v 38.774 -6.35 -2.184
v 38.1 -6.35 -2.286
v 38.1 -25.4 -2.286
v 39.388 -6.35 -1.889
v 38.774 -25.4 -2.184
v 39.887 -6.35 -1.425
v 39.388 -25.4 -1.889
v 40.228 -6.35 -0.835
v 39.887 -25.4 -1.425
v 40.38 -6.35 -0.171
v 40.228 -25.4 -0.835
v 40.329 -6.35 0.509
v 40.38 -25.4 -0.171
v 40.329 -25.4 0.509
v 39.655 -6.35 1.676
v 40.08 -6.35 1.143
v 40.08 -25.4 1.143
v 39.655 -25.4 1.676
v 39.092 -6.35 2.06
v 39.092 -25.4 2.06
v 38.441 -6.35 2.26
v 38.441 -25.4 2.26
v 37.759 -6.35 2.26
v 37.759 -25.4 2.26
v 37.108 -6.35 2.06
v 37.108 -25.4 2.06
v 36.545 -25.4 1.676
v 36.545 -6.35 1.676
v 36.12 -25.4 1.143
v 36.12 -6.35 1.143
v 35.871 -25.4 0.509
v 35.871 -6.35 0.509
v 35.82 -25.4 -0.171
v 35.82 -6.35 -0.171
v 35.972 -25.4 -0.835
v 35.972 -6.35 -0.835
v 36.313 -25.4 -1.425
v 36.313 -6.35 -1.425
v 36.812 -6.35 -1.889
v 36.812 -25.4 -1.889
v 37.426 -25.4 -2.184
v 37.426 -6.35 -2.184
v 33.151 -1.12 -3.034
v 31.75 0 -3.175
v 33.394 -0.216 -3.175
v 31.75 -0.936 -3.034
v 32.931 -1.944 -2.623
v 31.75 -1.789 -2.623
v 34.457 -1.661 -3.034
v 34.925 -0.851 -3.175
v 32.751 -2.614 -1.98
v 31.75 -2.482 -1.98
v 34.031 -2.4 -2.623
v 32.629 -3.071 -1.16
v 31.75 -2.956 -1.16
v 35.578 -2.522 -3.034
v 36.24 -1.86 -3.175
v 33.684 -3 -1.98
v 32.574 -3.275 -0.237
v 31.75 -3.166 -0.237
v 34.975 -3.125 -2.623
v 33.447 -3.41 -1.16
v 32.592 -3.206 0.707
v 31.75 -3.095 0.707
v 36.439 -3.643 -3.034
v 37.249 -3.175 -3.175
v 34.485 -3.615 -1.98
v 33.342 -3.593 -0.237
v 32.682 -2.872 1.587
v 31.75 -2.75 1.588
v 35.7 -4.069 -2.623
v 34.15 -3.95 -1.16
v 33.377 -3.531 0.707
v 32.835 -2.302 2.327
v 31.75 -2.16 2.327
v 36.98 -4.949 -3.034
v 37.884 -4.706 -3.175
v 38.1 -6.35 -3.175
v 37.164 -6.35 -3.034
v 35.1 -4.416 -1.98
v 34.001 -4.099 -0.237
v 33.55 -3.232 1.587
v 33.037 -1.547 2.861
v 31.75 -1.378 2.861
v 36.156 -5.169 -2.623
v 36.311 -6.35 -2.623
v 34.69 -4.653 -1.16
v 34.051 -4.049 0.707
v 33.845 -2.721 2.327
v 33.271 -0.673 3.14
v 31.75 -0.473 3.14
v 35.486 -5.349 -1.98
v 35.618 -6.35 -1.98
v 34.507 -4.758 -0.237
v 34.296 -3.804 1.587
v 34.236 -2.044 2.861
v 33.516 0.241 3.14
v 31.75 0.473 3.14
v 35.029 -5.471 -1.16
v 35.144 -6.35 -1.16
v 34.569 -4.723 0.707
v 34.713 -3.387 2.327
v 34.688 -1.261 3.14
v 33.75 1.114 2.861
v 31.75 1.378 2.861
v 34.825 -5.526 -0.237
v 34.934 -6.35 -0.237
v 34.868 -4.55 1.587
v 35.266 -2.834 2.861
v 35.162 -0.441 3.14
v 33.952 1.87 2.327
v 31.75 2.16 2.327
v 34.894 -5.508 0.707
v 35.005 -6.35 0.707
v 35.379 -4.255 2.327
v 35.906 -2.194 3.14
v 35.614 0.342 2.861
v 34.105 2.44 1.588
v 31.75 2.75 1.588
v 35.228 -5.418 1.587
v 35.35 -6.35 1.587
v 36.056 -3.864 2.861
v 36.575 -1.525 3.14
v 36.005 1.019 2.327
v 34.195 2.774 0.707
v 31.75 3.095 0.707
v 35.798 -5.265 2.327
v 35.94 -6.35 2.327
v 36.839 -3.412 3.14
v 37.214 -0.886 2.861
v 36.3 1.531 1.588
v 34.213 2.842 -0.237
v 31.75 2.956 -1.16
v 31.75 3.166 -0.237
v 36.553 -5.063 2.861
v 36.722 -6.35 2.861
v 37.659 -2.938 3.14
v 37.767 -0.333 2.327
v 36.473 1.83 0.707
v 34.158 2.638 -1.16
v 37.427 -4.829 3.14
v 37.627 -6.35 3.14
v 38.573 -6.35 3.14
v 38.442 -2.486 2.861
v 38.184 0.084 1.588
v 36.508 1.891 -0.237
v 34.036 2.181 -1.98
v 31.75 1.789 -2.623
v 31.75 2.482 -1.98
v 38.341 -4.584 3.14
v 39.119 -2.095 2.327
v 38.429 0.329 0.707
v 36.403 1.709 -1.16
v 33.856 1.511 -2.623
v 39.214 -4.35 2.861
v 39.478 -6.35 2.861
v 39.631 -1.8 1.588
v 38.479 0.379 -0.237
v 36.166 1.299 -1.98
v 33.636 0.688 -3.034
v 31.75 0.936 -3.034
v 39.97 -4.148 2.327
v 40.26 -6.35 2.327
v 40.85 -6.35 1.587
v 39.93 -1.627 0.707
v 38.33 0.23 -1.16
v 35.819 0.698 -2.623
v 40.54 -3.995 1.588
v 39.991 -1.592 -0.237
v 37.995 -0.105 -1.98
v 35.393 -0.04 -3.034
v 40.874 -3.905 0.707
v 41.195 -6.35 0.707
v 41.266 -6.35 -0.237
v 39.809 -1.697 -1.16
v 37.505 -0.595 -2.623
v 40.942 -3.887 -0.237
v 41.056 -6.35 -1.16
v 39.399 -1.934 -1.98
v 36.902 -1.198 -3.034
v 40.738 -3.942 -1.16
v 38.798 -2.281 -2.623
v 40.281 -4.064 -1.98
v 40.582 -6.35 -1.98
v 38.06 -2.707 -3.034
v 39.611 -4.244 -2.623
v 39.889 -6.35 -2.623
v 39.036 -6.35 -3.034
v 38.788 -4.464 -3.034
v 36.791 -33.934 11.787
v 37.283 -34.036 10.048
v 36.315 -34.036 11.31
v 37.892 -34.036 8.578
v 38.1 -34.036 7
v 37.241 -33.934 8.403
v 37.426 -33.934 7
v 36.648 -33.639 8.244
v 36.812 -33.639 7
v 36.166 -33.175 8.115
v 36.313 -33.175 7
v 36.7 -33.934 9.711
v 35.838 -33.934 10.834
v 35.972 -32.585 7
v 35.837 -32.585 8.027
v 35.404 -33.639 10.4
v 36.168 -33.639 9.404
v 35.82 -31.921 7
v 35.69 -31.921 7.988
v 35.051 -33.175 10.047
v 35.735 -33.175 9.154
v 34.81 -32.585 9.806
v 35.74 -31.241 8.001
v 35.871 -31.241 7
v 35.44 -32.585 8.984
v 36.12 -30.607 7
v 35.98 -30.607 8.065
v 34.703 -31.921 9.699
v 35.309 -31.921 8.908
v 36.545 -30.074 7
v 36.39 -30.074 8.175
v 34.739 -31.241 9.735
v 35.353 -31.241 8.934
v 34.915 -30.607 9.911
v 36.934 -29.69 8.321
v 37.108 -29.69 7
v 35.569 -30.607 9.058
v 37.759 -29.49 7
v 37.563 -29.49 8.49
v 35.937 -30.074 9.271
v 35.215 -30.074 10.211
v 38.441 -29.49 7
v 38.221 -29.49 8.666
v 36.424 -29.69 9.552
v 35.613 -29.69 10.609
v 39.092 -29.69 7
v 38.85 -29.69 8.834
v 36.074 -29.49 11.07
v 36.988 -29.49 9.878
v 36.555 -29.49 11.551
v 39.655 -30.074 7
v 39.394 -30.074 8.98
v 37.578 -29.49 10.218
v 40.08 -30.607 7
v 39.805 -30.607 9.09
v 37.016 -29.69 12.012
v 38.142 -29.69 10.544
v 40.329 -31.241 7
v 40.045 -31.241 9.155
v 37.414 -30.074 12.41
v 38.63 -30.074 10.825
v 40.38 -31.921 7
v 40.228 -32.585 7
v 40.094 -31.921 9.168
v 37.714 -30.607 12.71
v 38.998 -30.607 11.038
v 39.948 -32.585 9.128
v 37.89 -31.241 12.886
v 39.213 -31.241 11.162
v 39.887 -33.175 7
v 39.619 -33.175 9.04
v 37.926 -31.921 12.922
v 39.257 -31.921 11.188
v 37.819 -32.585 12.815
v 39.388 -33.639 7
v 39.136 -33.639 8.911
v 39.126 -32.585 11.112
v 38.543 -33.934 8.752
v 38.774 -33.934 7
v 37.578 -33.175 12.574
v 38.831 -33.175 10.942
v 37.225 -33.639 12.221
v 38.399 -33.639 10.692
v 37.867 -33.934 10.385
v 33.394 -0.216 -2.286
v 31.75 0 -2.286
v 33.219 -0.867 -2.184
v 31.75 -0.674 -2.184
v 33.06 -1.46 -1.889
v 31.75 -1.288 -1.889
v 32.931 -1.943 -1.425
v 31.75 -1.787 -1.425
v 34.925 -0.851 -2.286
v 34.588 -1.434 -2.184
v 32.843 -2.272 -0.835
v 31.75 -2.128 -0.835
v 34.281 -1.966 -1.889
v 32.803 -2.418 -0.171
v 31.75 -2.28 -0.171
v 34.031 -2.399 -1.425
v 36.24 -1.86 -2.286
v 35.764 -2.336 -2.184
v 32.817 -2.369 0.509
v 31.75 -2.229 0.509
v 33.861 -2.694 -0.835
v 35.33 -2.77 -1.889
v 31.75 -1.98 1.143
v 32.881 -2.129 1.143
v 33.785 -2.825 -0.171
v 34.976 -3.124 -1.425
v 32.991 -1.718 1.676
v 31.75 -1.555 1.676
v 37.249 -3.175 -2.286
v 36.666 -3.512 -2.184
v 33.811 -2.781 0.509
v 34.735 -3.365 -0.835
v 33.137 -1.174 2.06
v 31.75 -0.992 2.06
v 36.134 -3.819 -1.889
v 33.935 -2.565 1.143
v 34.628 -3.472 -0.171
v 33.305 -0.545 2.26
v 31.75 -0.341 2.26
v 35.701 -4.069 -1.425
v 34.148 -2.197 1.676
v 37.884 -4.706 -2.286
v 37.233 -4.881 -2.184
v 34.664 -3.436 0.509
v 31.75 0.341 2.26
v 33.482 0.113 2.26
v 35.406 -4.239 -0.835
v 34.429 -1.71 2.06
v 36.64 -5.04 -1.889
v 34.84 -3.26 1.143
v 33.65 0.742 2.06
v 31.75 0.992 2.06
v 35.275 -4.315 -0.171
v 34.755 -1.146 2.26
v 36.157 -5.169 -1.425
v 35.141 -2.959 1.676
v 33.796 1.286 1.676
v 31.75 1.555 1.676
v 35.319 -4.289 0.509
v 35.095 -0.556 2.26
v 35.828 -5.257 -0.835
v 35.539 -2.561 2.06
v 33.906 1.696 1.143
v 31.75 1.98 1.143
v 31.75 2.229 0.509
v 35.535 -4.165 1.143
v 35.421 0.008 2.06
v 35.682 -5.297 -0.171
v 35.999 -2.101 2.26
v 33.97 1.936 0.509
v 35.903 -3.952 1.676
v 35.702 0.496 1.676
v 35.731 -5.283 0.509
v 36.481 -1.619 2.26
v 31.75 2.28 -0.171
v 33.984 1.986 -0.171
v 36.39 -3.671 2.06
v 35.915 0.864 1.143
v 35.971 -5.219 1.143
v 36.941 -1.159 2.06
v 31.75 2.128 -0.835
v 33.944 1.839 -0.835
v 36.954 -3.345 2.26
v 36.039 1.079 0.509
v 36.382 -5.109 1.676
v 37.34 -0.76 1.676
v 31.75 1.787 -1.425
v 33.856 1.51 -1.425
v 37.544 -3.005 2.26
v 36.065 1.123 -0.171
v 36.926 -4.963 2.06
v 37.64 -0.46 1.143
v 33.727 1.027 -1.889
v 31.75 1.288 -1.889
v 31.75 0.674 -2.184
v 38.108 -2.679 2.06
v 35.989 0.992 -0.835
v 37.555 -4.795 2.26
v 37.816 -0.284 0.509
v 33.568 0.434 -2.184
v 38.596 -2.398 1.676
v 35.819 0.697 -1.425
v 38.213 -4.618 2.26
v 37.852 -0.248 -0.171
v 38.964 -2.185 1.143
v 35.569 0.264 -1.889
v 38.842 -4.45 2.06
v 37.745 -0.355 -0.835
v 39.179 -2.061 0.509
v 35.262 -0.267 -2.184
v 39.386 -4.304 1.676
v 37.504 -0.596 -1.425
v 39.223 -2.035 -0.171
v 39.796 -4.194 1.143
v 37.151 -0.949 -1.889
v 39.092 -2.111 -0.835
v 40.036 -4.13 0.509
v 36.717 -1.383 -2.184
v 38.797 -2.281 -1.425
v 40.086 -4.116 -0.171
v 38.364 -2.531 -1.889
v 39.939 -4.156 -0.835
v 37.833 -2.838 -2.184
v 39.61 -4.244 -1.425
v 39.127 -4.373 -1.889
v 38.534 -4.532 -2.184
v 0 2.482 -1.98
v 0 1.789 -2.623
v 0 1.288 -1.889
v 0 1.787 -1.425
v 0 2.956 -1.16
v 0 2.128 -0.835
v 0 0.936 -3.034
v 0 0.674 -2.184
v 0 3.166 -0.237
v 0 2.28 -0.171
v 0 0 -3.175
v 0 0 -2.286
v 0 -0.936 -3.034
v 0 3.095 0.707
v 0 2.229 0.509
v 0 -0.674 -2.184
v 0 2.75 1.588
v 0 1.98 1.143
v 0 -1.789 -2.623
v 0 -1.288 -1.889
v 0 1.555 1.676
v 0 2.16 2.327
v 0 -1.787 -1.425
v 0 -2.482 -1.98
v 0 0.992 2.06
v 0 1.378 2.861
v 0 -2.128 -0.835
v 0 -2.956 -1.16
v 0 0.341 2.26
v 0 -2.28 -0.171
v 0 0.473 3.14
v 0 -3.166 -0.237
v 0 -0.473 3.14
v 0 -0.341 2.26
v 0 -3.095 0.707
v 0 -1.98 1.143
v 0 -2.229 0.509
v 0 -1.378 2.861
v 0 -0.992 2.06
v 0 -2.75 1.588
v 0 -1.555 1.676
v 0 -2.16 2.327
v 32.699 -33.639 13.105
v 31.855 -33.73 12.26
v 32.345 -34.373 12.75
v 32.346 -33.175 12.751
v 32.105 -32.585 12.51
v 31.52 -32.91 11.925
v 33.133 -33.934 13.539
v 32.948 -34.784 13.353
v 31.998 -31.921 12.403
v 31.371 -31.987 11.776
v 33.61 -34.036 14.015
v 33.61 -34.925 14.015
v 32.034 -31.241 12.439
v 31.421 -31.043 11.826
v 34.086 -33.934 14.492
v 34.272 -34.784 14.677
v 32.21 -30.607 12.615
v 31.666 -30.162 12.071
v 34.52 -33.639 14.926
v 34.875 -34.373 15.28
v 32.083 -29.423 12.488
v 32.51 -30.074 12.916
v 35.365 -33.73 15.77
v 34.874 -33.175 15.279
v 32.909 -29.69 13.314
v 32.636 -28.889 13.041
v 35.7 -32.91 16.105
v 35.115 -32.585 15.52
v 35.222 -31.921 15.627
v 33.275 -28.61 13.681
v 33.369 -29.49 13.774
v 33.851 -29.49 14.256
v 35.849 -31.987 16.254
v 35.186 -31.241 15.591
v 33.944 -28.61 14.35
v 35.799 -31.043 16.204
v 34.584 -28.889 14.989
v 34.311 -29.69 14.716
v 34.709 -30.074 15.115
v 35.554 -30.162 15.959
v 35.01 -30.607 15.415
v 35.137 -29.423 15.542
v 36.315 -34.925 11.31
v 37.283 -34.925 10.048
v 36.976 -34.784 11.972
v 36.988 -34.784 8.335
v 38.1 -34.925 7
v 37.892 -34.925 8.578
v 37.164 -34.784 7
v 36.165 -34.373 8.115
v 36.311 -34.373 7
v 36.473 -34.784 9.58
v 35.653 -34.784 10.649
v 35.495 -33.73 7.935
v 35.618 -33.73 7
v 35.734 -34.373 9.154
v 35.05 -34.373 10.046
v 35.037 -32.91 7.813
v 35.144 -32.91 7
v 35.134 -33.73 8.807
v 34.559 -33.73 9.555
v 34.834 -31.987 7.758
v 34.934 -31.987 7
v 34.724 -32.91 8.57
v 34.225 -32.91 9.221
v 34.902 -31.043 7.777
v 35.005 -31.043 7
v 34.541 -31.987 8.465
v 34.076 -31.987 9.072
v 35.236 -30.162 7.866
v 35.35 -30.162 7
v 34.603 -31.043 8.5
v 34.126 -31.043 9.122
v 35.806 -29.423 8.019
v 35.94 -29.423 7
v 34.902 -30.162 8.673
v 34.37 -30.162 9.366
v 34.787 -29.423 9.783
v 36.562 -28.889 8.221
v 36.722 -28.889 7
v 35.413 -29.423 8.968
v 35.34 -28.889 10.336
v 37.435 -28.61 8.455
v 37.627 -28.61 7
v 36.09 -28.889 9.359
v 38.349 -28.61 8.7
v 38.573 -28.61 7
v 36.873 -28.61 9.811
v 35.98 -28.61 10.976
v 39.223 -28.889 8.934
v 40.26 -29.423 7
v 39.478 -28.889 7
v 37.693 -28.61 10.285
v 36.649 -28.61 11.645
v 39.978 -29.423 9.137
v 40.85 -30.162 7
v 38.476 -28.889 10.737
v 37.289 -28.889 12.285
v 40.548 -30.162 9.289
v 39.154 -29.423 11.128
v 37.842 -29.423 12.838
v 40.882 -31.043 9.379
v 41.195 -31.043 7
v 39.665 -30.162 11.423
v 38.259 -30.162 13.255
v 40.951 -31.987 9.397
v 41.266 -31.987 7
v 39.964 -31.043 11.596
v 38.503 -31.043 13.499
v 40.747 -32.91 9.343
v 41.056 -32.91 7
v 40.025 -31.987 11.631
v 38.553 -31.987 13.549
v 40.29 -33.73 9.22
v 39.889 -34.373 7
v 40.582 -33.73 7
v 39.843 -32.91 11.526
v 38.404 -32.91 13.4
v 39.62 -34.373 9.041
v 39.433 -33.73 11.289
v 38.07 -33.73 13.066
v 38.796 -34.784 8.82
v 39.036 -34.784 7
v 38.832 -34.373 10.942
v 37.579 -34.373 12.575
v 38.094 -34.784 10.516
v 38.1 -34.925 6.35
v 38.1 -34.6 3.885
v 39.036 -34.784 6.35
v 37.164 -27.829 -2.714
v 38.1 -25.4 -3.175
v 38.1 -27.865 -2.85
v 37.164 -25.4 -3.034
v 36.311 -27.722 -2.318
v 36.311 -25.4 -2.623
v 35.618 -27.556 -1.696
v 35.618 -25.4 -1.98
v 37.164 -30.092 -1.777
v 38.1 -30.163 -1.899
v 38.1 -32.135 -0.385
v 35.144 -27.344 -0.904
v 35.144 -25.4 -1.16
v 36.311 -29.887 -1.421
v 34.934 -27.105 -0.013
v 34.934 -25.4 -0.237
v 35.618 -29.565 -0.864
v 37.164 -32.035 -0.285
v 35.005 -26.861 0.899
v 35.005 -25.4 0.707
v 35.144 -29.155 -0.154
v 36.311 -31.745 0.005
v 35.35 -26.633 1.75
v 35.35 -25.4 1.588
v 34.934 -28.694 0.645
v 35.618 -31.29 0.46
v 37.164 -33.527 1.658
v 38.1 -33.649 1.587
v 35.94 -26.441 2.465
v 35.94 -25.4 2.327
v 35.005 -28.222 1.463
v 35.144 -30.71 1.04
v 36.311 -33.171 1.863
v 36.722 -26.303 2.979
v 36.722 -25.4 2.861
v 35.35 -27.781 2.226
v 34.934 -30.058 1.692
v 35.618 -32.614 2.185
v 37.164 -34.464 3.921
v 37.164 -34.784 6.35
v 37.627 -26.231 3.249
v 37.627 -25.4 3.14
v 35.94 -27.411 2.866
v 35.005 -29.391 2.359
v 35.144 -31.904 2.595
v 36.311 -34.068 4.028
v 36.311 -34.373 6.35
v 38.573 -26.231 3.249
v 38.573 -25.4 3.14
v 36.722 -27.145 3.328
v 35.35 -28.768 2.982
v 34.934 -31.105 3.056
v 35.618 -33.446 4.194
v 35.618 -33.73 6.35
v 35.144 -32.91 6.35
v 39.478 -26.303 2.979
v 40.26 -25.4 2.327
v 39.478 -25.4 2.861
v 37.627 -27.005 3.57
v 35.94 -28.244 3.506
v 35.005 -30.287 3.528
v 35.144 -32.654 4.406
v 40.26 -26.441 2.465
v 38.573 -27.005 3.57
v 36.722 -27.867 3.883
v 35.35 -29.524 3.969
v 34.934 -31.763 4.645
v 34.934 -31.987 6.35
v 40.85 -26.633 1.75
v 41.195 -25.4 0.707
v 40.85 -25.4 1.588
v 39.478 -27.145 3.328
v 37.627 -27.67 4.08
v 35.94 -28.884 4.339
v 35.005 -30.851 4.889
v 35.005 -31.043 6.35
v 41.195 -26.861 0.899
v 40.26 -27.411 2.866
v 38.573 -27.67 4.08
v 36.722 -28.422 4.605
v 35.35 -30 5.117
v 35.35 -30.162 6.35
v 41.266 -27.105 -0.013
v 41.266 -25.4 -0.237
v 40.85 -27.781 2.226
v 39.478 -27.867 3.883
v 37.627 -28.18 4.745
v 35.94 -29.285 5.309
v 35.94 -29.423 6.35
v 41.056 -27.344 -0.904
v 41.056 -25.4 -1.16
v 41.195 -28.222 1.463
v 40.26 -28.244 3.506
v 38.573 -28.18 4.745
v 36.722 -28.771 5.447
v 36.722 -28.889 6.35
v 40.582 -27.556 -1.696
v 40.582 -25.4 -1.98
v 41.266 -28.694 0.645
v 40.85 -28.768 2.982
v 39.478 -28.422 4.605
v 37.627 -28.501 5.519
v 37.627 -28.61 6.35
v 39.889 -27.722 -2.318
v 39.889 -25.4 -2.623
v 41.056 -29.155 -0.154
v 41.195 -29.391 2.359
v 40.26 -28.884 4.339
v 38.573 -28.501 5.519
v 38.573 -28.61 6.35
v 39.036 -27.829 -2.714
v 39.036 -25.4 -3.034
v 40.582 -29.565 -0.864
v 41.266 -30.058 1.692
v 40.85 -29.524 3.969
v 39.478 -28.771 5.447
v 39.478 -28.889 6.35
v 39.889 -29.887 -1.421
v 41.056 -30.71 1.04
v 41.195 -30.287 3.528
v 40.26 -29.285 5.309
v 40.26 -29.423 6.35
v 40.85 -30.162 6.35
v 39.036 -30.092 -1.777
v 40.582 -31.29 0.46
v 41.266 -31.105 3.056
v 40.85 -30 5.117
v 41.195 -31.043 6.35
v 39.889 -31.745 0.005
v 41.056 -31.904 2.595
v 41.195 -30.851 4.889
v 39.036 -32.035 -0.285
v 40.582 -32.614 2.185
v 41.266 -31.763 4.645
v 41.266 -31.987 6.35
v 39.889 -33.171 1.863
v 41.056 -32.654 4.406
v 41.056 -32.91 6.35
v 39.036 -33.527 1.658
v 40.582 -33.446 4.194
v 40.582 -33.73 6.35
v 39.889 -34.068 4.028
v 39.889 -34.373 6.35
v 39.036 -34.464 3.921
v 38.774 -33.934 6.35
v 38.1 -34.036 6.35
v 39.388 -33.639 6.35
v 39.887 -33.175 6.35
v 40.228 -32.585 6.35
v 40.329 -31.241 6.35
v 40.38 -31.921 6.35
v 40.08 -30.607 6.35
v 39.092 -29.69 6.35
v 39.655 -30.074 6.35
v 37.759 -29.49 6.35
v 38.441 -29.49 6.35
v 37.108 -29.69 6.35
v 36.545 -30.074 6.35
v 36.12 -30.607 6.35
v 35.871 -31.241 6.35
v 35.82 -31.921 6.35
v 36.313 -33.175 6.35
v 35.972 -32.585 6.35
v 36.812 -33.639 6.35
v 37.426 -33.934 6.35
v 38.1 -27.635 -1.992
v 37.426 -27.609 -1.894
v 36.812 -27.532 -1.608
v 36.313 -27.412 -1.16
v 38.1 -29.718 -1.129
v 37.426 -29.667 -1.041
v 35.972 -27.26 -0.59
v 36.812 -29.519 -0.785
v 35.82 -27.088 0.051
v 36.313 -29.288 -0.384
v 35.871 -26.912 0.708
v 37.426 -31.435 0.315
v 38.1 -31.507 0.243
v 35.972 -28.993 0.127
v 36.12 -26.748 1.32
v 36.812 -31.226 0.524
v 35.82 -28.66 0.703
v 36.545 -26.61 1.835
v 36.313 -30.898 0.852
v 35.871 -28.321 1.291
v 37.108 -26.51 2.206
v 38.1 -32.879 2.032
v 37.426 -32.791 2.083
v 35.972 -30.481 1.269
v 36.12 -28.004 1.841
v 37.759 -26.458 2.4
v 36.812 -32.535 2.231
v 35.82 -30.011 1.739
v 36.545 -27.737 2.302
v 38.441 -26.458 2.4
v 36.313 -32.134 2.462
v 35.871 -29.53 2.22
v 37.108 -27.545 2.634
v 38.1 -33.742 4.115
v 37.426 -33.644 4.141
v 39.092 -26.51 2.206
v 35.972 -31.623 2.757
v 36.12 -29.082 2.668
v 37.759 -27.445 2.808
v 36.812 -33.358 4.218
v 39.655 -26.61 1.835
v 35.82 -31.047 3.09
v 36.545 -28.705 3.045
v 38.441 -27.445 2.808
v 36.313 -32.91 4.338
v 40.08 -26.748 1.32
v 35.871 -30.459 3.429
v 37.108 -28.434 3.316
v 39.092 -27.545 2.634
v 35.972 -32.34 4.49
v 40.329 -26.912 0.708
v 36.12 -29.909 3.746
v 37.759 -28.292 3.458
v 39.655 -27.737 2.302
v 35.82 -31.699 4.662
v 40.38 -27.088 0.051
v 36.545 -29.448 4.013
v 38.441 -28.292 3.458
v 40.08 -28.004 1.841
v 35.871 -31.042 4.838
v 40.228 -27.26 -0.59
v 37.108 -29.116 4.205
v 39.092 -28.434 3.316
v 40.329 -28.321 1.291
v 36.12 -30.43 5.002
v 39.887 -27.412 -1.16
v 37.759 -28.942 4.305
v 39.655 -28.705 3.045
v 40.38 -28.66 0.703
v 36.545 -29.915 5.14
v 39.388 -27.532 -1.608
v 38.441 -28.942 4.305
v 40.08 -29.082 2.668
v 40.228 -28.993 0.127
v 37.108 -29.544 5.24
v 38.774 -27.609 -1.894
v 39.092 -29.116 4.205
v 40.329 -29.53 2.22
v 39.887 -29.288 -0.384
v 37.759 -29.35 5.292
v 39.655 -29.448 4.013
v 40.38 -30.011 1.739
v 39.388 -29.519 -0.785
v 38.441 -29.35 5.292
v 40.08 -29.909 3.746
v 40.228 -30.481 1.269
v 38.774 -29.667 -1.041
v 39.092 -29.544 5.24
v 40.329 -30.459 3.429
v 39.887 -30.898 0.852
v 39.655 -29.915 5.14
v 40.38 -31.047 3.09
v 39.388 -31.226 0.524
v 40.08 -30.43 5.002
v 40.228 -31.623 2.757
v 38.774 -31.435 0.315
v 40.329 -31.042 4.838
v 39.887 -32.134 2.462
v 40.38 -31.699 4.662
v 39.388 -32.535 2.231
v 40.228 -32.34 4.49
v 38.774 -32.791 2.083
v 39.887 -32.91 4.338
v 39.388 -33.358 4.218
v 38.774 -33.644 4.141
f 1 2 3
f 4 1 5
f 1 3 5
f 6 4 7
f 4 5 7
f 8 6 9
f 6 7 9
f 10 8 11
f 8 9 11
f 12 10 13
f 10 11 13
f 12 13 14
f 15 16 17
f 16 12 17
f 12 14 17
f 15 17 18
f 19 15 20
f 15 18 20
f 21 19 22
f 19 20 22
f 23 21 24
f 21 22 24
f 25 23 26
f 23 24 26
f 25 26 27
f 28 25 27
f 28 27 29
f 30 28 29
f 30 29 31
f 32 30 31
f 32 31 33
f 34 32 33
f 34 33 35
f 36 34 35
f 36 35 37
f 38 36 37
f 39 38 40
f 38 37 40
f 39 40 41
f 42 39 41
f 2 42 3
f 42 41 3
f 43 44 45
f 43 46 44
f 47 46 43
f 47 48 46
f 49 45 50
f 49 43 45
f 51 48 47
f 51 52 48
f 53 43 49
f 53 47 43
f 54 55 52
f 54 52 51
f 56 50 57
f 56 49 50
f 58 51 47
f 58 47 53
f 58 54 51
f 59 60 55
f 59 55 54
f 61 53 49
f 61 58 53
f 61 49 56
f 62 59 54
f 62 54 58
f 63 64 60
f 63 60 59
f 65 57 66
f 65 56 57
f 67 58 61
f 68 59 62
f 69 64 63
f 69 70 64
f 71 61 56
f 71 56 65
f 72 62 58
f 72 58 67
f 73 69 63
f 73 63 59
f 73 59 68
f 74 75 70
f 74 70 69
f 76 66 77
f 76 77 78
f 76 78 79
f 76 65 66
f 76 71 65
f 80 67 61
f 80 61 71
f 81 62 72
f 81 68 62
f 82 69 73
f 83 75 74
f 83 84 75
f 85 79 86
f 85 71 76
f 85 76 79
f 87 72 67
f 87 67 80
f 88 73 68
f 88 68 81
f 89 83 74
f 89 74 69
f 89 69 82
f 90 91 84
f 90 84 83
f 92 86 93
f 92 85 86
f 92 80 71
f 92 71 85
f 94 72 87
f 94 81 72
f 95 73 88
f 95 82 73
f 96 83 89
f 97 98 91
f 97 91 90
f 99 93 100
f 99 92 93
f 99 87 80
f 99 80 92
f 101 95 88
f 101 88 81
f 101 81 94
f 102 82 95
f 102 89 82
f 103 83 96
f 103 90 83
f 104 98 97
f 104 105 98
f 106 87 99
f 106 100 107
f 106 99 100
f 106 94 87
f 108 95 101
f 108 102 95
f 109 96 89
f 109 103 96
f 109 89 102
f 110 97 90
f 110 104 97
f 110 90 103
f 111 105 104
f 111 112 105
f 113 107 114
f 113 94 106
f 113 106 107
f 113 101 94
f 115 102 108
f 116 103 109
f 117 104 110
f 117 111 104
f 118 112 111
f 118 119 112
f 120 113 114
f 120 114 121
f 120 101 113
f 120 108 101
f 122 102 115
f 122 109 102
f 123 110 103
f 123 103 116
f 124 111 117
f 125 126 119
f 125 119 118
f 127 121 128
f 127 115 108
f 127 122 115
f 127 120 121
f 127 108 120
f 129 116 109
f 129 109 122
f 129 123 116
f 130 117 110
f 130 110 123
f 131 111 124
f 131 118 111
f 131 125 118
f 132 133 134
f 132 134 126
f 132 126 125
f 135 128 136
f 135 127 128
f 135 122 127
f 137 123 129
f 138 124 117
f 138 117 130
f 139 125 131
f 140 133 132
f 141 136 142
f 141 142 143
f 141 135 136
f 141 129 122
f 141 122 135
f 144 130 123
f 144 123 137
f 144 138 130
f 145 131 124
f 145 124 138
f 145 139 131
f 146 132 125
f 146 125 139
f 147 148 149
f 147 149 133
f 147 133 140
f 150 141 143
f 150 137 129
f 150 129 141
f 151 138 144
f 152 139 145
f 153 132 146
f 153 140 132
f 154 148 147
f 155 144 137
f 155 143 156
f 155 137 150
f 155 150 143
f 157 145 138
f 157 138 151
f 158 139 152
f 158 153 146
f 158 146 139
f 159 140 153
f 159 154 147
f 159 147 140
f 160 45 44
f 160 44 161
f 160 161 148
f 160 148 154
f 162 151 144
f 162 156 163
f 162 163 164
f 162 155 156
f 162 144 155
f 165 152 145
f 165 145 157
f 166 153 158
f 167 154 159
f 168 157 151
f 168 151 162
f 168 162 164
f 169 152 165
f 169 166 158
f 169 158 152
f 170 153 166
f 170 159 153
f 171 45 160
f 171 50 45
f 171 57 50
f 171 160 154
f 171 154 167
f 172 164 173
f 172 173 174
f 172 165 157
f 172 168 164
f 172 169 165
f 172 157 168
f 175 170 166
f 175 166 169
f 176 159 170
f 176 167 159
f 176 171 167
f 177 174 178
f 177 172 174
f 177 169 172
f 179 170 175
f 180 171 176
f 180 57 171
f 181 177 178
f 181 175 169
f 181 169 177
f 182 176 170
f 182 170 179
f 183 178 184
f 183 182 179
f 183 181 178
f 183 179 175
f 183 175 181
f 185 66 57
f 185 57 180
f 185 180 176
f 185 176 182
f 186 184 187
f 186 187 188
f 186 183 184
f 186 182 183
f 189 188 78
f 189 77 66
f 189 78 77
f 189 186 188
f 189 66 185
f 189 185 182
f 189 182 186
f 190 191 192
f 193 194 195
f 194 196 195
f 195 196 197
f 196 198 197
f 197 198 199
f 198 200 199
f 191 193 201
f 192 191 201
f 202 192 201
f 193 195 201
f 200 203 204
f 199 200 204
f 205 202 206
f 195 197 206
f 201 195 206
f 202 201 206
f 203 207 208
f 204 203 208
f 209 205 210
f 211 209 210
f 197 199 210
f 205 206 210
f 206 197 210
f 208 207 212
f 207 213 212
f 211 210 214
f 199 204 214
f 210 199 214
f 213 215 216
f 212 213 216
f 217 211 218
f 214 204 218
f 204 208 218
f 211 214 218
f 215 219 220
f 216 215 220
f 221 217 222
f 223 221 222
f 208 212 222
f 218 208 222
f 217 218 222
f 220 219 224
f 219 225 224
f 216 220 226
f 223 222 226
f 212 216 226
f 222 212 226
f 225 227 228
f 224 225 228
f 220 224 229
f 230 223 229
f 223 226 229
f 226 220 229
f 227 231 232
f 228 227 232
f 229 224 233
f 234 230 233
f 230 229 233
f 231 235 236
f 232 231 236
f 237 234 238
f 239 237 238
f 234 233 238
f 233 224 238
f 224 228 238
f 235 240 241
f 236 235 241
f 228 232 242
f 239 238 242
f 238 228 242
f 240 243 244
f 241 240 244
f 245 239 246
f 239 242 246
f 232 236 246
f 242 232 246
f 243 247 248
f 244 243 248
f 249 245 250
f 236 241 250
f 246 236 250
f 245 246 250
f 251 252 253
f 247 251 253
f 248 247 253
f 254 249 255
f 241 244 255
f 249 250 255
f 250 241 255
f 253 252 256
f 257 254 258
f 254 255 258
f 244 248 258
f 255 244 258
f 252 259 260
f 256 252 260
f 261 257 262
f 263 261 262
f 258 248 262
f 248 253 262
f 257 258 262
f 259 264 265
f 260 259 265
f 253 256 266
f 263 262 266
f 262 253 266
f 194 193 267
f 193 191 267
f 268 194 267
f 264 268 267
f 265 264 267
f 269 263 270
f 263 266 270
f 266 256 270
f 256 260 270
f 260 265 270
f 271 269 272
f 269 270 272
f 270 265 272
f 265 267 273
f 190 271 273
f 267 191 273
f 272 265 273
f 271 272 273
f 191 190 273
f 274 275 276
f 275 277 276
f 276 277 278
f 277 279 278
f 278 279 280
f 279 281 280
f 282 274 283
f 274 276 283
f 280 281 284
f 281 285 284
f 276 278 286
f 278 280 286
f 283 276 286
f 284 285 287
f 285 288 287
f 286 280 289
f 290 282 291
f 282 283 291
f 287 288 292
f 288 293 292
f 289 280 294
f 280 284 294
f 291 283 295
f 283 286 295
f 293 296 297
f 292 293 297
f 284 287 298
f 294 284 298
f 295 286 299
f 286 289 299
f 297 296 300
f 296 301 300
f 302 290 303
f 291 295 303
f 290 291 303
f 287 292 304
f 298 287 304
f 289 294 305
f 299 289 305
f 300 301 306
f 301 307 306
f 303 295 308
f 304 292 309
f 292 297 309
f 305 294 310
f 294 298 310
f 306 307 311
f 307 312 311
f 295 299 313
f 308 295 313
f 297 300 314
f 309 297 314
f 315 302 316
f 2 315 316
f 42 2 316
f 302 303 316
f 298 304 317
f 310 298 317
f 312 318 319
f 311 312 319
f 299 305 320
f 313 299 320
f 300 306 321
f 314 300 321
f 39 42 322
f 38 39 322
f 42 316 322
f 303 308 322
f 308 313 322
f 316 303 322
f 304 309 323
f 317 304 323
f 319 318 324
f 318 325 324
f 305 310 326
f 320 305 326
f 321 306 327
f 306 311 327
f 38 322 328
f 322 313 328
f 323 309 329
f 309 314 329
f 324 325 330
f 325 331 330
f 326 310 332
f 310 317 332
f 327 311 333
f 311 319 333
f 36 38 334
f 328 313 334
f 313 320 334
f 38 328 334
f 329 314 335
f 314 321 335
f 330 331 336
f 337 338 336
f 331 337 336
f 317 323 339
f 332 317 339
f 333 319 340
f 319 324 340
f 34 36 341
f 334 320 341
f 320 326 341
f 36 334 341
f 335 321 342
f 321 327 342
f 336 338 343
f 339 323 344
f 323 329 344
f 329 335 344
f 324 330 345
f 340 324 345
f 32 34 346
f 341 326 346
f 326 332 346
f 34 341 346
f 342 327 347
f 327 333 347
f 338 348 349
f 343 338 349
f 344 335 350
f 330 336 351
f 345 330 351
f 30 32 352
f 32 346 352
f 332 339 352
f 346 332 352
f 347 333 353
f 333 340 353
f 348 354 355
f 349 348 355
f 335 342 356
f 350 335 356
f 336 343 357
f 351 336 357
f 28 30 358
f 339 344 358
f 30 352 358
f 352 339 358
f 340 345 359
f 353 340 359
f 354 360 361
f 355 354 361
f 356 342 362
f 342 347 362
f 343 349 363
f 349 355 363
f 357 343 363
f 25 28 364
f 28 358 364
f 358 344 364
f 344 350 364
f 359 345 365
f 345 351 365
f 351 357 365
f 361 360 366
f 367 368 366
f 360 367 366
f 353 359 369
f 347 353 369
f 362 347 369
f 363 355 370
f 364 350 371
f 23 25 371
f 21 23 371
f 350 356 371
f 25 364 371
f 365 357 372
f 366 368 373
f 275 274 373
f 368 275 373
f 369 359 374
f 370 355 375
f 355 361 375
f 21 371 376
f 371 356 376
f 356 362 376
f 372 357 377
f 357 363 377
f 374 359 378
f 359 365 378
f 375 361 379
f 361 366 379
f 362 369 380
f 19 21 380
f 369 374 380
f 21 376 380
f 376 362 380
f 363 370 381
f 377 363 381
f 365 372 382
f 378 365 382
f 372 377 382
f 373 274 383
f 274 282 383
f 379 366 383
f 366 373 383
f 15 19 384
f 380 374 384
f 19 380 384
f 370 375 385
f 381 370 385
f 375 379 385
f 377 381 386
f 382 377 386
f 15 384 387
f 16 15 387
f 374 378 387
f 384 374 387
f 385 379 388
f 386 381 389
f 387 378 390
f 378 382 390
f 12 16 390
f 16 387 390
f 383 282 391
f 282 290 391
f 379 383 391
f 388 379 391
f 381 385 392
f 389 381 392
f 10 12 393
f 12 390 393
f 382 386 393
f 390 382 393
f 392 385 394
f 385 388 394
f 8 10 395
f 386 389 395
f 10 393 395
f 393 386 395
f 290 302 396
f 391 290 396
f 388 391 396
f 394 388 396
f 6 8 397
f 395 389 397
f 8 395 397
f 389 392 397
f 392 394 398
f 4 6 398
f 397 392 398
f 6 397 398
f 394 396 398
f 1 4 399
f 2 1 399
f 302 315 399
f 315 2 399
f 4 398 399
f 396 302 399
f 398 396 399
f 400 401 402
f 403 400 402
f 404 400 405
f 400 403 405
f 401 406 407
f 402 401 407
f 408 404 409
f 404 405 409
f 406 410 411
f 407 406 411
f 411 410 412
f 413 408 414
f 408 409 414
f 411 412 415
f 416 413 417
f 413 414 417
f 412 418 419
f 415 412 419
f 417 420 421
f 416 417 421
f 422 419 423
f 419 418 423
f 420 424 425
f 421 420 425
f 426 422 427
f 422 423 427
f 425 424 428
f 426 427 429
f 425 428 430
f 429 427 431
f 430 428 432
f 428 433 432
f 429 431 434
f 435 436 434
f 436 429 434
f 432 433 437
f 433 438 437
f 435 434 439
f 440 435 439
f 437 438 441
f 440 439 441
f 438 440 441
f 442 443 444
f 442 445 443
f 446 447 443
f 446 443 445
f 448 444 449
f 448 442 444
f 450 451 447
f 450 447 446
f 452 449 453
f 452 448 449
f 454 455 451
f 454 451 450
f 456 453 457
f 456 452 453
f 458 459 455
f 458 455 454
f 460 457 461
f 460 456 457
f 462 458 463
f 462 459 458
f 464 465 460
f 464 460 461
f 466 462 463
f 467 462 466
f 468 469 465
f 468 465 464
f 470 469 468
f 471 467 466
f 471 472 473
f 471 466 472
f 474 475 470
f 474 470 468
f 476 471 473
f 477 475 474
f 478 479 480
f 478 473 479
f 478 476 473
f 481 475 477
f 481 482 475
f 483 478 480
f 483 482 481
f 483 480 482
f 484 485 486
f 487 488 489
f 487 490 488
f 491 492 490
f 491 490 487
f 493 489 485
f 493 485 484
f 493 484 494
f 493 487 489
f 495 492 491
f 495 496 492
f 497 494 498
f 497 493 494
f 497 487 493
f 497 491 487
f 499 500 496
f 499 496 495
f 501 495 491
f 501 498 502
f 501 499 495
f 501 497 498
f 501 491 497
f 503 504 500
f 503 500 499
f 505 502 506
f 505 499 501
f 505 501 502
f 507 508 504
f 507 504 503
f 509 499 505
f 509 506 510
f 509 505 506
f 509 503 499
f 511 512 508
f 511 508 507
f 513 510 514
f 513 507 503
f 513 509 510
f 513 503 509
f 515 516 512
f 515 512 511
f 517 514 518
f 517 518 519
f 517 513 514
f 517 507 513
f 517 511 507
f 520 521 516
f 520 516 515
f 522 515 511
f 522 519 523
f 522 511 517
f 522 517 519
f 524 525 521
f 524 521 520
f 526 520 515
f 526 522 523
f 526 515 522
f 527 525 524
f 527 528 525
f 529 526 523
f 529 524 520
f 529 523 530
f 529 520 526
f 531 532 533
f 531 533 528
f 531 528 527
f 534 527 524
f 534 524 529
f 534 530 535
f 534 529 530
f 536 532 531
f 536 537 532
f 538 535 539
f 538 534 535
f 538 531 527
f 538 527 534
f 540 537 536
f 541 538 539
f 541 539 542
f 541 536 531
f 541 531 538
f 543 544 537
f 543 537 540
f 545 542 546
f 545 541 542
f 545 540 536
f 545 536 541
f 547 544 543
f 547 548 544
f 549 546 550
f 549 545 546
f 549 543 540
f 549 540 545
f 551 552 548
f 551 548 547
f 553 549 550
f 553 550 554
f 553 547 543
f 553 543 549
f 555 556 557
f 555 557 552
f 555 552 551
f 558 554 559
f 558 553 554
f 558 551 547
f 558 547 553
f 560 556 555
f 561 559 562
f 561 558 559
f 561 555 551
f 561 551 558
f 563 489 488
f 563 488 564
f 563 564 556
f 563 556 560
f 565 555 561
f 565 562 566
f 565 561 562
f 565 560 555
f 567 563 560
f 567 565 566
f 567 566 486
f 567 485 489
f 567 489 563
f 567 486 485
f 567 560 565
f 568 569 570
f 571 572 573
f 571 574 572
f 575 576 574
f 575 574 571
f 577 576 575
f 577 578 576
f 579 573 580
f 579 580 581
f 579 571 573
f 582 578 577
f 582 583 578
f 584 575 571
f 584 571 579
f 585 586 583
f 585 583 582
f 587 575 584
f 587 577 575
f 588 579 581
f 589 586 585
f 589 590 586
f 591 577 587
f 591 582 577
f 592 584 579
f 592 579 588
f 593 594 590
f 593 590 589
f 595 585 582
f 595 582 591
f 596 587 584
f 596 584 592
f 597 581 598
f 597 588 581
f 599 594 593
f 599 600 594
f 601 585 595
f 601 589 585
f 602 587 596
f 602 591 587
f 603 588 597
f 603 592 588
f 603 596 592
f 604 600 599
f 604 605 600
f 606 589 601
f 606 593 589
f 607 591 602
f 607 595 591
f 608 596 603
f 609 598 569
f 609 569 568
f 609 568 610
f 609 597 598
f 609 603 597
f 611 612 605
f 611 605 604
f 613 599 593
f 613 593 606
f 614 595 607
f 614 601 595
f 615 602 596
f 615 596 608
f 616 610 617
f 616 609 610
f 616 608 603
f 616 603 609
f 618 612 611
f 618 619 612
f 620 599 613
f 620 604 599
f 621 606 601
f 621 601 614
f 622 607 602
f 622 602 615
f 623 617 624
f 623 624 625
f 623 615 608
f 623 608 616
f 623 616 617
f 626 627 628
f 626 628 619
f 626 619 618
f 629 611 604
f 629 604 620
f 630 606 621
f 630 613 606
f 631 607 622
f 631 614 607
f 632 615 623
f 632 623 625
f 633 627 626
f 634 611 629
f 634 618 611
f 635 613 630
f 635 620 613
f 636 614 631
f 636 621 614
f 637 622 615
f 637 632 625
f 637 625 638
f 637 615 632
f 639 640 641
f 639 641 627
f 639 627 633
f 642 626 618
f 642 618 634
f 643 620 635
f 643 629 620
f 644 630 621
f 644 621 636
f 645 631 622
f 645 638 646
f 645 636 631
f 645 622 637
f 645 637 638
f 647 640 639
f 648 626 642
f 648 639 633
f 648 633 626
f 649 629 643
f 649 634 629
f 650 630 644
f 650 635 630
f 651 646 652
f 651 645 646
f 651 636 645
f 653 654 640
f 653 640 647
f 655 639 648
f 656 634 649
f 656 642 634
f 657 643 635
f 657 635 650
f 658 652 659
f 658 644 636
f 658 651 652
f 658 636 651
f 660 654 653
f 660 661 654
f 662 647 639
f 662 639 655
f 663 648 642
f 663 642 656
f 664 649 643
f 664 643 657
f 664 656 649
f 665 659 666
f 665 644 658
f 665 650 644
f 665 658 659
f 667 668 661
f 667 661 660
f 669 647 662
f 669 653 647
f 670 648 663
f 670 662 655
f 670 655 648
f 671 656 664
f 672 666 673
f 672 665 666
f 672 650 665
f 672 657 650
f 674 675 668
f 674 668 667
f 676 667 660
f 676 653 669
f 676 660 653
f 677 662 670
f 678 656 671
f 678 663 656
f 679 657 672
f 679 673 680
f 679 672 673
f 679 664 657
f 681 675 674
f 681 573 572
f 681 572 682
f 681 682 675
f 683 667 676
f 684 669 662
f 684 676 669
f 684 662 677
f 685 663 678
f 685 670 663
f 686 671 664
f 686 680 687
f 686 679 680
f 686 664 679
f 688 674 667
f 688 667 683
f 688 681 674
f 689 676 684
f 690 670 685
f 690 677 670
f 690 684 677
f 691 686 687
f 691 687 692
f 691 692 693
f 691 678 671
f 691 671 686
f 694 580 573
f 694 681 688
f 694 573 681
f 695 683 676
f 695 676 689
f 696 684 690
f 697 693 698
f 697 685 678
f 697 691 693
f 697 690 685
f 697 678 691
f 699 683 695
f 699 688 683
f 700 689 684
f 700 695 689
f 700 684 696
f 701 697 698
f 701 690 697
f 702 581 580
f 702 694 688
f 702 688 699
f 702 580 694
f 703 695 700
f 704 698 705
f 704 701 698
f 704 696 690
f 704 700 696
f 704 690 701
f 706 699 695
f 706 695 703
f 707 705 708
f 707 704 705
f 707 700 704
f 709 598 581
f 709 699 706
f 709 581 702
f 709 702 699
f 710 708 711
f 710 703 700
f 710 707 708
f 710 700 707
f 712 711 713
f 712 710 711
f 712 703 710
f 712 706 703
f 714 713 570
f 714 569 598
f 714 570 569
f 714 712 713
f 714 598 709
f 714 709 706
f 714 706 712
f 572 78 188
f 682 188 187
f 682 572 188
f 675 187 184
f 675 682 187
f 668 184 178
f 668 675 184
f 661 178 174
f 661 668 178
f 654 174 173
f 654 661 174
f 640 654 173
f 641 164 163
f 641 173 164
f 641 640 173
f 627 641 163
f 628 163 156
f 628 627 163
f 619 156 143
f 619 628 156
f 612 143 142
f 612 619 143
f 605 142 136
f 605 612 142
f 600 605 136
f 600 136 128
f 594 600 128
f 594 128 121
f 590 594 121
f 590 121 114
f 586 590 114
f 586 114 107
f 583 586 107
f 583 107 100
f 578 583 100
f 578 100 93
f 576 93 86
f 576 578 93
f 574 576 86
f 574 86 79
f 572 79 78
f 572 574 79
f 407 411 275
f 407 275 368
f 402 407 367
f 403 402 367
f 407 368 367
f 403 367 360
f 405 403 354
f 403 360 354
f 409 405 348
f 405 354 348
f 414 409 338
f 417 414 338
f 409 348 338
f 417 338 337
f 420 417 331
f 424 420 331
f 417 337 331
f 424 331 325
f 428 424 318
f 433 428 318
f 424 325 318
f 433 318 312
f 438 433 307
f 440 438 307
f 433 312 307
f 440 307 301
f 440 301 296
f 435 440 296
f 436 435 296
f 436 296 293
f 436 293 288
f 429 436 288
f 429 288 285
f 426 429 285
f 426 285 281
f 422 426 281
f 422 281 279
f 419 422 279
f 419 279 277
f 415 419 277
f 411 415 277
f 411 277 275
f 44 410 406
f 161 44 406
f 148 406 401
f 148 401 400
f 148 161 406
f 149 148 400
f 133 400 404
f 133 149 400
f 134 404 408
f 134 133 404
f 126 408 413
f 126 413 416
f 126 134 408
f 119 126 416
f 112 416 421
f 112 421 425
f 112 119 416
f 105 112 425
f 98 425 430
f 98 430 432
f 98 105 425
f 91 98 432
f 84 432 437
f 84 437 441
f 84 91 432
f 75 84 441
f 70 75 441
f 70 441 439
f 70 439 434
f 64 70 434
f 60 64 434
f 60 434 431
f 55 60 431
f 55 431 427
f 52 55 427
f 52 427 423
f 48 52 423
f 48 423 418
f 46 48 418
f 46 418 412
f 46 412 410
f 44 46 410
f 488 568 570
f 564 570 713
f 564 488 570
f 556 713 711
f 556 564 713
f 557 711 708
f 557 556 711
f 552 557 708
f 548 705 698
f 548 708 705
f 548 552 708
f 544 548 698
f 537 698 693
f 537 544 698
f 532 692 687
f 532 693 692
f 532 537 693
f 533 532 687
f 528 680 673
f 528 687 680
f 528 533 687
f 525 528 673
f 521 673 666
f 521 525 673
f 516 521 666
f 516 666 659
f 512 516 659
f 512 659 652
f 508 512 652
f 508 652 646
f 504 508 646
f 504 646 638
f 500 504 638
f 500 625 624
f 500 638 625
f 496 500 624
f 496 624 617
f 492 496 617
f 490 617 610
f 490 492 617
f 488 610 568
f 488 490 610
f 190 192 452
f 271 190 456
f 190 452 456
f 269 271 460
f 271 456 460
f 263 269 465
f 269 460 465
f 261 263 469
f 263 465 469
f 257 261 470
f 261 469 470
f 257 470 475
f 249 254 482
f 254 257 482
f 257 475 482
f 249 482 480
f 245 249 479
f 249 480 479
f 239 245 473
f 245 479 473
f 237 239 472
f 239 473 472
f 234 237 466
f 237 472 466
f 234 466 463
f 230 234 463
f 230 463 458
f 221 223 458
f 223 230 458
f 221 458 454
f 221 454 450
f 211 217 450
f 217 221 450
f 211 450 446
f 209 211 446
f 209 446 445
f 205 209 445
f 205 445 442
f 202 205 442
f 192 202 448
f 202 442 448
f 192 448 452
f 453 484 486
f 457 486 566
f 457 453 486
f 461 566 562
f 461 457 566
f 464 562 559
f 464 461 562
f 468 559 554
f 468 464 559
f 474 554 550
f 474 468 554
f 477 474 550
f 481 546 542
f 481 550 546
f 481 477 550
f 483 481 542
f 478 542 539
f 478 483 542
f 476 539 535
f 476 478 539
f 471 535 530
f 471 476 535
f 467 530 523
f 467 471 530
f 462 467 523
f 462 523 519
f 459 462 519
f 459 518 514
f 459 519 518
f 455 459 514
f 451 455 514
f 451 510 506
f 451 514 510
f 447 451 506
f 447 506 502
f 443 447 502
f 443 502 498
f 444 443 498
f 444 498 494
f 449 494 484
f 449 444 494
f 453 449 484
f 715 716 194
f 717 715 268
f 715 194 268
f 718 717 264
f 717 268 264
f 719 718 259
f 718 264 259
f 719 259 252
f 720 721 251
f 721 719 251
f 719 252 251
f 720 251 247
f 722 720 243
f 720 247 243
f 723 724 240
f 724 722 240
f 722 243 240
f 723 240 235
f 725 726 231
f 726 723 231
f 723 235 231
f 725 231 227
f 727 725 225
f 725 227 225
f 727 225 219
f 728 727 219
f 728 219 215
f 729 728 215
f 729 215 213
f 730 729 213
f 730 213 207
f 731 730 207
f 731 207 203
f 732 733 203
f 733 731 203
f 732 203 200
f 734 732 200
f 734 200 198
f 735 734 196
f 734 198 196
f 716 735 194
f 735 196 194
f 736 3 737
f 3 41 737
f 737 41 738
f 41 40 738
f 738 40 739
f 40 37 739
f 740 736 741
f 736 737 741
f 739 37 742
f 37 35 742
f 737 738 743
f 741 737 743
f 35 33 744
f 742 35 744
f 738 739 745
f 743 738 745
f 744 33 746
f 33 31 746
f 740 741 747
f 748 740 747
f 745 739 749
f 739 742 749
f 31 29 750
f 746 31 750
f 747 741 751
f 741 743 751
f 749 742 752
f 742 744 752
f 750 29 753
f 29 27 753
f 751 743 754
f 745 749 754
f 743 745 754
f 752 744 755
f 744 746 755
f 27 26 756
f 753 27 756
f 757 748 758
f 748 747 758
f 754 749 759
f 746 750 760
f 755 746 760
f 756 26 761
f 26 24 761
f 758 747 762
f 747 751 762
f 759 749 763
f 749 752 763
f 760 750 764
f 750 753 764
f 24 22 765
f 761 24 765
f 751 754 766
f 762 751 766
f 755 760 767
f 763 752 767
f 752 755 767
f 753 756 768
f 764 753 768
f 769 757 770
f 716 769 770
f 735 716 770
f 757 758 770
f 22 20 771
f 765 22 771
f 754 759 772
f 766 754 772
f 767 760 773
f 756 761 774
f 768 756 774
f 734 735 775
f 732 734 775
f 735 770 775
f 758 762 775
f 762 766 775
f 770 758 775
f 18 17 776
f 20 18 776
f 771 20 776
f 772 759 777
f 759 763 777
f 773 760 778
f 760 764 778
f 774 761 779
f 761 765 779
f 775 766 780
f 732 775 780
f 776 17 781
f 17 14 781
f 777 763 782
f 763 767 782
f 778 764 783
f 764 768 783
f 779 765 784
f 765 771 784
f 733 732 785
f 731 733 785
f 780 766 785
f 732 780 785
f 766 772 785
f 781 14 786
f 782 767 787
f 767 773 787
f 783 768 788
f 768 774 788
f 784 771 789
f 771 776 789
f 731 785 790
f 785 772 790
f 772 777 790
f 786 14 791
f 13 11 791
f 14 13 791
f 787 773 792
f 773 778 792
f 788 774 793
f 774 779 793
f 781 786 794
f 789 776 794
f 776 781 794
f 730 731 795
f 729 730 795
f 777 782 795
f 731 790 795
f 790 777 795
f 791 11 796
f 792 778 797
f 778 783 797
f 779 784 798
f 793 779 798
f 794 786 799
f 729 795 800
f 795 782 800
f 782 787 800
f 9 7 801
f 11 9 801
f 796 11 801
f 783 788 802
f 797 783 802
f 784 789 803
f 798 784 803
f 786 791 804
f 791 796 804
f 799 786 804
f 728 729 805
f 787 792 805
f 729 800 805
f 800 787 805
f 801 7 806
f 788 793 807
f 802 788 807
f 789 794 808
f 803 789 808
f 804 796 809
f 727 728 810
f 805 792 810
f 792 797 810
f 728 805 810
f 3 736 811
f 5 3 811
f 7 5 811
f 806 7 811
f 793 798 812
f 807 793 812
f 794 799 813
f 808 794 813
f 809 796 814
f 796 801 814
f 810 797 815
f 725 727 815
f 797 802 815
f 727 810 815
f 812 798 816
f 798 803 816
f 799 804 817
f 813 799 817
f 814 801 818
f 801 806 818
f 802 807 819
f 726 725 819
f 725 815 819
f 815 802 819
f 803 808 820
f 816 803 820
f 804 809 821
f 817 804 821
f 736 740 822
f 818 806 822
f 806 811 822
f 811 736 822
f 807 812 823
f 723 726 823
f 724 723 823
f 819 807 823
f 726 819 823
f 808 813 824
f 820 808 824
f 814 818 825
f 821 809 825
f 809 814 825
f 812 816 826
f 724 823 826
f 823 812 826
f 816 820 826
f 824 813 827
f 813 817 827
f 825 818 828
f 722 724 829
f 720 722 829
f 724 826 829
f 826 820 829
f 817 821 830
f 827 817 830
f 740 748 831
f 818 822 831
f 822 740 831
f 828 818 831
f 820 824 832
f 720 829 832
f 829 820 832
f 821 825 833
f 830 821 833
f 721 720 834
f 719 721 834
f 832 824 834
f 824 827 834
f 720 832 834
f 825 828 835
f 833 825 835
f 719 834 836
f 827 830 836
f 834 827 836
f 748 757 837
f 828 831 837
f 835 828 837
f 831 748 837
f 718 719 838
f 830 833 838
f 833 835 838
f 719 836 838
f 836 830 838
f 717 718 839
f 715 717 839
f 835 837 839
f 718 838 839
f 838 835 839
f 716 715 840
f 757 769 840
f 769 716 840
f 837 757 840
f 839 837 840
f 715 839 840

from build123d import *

# Parameters (mm, degrees)
SKETCH2_R   = 3.175
SKETCH2_R_2 = 2.286


with BuildPart() as part:
    # Sweep1: sweep along a curve in space
    with BuildLine() as sweep1_path:
        Line((0, 0, 0), (31.75, 0, 0))
        ThreePointArc((31.75, 0, 0), (36.240128061, -1.859871939, 0), (38.1, -6.35, 0))
        Line((38.1, -6.35, 0), (38.1, -25.4, 0))
        ThreePointArc((38.1, -25.4, 0), (38.1, -29.890128061, 1.859871939), (38.1, -31.75, 6.35))
        Line((38.1, -31.75, 6.35), (38.1, -31.75, 6.999954124))
        ThreePointArc((38.1, -31.75, 6.999954124), (37.63596963, -31.75, 9.332792327), (36.314522938, -31.75, 11.310477062))
        Line((36.314522938, -31.75, 11.310477062), (33.609871939, -31.75, 14.015128061))
    # Sketch2 → Sweep1 (sweep)
    with BuildSketch(Plane(origin=(0, 0, 0), x_dir=(0, 0, -1), z_dir=(1, 0, 0))):
        Circle(SKETCH2_R)
        Circle(SKETCH2_R_2, mode=Mode.SUBTRACT)
    sweep(path=sweep1_path.line)


solid = part.part
